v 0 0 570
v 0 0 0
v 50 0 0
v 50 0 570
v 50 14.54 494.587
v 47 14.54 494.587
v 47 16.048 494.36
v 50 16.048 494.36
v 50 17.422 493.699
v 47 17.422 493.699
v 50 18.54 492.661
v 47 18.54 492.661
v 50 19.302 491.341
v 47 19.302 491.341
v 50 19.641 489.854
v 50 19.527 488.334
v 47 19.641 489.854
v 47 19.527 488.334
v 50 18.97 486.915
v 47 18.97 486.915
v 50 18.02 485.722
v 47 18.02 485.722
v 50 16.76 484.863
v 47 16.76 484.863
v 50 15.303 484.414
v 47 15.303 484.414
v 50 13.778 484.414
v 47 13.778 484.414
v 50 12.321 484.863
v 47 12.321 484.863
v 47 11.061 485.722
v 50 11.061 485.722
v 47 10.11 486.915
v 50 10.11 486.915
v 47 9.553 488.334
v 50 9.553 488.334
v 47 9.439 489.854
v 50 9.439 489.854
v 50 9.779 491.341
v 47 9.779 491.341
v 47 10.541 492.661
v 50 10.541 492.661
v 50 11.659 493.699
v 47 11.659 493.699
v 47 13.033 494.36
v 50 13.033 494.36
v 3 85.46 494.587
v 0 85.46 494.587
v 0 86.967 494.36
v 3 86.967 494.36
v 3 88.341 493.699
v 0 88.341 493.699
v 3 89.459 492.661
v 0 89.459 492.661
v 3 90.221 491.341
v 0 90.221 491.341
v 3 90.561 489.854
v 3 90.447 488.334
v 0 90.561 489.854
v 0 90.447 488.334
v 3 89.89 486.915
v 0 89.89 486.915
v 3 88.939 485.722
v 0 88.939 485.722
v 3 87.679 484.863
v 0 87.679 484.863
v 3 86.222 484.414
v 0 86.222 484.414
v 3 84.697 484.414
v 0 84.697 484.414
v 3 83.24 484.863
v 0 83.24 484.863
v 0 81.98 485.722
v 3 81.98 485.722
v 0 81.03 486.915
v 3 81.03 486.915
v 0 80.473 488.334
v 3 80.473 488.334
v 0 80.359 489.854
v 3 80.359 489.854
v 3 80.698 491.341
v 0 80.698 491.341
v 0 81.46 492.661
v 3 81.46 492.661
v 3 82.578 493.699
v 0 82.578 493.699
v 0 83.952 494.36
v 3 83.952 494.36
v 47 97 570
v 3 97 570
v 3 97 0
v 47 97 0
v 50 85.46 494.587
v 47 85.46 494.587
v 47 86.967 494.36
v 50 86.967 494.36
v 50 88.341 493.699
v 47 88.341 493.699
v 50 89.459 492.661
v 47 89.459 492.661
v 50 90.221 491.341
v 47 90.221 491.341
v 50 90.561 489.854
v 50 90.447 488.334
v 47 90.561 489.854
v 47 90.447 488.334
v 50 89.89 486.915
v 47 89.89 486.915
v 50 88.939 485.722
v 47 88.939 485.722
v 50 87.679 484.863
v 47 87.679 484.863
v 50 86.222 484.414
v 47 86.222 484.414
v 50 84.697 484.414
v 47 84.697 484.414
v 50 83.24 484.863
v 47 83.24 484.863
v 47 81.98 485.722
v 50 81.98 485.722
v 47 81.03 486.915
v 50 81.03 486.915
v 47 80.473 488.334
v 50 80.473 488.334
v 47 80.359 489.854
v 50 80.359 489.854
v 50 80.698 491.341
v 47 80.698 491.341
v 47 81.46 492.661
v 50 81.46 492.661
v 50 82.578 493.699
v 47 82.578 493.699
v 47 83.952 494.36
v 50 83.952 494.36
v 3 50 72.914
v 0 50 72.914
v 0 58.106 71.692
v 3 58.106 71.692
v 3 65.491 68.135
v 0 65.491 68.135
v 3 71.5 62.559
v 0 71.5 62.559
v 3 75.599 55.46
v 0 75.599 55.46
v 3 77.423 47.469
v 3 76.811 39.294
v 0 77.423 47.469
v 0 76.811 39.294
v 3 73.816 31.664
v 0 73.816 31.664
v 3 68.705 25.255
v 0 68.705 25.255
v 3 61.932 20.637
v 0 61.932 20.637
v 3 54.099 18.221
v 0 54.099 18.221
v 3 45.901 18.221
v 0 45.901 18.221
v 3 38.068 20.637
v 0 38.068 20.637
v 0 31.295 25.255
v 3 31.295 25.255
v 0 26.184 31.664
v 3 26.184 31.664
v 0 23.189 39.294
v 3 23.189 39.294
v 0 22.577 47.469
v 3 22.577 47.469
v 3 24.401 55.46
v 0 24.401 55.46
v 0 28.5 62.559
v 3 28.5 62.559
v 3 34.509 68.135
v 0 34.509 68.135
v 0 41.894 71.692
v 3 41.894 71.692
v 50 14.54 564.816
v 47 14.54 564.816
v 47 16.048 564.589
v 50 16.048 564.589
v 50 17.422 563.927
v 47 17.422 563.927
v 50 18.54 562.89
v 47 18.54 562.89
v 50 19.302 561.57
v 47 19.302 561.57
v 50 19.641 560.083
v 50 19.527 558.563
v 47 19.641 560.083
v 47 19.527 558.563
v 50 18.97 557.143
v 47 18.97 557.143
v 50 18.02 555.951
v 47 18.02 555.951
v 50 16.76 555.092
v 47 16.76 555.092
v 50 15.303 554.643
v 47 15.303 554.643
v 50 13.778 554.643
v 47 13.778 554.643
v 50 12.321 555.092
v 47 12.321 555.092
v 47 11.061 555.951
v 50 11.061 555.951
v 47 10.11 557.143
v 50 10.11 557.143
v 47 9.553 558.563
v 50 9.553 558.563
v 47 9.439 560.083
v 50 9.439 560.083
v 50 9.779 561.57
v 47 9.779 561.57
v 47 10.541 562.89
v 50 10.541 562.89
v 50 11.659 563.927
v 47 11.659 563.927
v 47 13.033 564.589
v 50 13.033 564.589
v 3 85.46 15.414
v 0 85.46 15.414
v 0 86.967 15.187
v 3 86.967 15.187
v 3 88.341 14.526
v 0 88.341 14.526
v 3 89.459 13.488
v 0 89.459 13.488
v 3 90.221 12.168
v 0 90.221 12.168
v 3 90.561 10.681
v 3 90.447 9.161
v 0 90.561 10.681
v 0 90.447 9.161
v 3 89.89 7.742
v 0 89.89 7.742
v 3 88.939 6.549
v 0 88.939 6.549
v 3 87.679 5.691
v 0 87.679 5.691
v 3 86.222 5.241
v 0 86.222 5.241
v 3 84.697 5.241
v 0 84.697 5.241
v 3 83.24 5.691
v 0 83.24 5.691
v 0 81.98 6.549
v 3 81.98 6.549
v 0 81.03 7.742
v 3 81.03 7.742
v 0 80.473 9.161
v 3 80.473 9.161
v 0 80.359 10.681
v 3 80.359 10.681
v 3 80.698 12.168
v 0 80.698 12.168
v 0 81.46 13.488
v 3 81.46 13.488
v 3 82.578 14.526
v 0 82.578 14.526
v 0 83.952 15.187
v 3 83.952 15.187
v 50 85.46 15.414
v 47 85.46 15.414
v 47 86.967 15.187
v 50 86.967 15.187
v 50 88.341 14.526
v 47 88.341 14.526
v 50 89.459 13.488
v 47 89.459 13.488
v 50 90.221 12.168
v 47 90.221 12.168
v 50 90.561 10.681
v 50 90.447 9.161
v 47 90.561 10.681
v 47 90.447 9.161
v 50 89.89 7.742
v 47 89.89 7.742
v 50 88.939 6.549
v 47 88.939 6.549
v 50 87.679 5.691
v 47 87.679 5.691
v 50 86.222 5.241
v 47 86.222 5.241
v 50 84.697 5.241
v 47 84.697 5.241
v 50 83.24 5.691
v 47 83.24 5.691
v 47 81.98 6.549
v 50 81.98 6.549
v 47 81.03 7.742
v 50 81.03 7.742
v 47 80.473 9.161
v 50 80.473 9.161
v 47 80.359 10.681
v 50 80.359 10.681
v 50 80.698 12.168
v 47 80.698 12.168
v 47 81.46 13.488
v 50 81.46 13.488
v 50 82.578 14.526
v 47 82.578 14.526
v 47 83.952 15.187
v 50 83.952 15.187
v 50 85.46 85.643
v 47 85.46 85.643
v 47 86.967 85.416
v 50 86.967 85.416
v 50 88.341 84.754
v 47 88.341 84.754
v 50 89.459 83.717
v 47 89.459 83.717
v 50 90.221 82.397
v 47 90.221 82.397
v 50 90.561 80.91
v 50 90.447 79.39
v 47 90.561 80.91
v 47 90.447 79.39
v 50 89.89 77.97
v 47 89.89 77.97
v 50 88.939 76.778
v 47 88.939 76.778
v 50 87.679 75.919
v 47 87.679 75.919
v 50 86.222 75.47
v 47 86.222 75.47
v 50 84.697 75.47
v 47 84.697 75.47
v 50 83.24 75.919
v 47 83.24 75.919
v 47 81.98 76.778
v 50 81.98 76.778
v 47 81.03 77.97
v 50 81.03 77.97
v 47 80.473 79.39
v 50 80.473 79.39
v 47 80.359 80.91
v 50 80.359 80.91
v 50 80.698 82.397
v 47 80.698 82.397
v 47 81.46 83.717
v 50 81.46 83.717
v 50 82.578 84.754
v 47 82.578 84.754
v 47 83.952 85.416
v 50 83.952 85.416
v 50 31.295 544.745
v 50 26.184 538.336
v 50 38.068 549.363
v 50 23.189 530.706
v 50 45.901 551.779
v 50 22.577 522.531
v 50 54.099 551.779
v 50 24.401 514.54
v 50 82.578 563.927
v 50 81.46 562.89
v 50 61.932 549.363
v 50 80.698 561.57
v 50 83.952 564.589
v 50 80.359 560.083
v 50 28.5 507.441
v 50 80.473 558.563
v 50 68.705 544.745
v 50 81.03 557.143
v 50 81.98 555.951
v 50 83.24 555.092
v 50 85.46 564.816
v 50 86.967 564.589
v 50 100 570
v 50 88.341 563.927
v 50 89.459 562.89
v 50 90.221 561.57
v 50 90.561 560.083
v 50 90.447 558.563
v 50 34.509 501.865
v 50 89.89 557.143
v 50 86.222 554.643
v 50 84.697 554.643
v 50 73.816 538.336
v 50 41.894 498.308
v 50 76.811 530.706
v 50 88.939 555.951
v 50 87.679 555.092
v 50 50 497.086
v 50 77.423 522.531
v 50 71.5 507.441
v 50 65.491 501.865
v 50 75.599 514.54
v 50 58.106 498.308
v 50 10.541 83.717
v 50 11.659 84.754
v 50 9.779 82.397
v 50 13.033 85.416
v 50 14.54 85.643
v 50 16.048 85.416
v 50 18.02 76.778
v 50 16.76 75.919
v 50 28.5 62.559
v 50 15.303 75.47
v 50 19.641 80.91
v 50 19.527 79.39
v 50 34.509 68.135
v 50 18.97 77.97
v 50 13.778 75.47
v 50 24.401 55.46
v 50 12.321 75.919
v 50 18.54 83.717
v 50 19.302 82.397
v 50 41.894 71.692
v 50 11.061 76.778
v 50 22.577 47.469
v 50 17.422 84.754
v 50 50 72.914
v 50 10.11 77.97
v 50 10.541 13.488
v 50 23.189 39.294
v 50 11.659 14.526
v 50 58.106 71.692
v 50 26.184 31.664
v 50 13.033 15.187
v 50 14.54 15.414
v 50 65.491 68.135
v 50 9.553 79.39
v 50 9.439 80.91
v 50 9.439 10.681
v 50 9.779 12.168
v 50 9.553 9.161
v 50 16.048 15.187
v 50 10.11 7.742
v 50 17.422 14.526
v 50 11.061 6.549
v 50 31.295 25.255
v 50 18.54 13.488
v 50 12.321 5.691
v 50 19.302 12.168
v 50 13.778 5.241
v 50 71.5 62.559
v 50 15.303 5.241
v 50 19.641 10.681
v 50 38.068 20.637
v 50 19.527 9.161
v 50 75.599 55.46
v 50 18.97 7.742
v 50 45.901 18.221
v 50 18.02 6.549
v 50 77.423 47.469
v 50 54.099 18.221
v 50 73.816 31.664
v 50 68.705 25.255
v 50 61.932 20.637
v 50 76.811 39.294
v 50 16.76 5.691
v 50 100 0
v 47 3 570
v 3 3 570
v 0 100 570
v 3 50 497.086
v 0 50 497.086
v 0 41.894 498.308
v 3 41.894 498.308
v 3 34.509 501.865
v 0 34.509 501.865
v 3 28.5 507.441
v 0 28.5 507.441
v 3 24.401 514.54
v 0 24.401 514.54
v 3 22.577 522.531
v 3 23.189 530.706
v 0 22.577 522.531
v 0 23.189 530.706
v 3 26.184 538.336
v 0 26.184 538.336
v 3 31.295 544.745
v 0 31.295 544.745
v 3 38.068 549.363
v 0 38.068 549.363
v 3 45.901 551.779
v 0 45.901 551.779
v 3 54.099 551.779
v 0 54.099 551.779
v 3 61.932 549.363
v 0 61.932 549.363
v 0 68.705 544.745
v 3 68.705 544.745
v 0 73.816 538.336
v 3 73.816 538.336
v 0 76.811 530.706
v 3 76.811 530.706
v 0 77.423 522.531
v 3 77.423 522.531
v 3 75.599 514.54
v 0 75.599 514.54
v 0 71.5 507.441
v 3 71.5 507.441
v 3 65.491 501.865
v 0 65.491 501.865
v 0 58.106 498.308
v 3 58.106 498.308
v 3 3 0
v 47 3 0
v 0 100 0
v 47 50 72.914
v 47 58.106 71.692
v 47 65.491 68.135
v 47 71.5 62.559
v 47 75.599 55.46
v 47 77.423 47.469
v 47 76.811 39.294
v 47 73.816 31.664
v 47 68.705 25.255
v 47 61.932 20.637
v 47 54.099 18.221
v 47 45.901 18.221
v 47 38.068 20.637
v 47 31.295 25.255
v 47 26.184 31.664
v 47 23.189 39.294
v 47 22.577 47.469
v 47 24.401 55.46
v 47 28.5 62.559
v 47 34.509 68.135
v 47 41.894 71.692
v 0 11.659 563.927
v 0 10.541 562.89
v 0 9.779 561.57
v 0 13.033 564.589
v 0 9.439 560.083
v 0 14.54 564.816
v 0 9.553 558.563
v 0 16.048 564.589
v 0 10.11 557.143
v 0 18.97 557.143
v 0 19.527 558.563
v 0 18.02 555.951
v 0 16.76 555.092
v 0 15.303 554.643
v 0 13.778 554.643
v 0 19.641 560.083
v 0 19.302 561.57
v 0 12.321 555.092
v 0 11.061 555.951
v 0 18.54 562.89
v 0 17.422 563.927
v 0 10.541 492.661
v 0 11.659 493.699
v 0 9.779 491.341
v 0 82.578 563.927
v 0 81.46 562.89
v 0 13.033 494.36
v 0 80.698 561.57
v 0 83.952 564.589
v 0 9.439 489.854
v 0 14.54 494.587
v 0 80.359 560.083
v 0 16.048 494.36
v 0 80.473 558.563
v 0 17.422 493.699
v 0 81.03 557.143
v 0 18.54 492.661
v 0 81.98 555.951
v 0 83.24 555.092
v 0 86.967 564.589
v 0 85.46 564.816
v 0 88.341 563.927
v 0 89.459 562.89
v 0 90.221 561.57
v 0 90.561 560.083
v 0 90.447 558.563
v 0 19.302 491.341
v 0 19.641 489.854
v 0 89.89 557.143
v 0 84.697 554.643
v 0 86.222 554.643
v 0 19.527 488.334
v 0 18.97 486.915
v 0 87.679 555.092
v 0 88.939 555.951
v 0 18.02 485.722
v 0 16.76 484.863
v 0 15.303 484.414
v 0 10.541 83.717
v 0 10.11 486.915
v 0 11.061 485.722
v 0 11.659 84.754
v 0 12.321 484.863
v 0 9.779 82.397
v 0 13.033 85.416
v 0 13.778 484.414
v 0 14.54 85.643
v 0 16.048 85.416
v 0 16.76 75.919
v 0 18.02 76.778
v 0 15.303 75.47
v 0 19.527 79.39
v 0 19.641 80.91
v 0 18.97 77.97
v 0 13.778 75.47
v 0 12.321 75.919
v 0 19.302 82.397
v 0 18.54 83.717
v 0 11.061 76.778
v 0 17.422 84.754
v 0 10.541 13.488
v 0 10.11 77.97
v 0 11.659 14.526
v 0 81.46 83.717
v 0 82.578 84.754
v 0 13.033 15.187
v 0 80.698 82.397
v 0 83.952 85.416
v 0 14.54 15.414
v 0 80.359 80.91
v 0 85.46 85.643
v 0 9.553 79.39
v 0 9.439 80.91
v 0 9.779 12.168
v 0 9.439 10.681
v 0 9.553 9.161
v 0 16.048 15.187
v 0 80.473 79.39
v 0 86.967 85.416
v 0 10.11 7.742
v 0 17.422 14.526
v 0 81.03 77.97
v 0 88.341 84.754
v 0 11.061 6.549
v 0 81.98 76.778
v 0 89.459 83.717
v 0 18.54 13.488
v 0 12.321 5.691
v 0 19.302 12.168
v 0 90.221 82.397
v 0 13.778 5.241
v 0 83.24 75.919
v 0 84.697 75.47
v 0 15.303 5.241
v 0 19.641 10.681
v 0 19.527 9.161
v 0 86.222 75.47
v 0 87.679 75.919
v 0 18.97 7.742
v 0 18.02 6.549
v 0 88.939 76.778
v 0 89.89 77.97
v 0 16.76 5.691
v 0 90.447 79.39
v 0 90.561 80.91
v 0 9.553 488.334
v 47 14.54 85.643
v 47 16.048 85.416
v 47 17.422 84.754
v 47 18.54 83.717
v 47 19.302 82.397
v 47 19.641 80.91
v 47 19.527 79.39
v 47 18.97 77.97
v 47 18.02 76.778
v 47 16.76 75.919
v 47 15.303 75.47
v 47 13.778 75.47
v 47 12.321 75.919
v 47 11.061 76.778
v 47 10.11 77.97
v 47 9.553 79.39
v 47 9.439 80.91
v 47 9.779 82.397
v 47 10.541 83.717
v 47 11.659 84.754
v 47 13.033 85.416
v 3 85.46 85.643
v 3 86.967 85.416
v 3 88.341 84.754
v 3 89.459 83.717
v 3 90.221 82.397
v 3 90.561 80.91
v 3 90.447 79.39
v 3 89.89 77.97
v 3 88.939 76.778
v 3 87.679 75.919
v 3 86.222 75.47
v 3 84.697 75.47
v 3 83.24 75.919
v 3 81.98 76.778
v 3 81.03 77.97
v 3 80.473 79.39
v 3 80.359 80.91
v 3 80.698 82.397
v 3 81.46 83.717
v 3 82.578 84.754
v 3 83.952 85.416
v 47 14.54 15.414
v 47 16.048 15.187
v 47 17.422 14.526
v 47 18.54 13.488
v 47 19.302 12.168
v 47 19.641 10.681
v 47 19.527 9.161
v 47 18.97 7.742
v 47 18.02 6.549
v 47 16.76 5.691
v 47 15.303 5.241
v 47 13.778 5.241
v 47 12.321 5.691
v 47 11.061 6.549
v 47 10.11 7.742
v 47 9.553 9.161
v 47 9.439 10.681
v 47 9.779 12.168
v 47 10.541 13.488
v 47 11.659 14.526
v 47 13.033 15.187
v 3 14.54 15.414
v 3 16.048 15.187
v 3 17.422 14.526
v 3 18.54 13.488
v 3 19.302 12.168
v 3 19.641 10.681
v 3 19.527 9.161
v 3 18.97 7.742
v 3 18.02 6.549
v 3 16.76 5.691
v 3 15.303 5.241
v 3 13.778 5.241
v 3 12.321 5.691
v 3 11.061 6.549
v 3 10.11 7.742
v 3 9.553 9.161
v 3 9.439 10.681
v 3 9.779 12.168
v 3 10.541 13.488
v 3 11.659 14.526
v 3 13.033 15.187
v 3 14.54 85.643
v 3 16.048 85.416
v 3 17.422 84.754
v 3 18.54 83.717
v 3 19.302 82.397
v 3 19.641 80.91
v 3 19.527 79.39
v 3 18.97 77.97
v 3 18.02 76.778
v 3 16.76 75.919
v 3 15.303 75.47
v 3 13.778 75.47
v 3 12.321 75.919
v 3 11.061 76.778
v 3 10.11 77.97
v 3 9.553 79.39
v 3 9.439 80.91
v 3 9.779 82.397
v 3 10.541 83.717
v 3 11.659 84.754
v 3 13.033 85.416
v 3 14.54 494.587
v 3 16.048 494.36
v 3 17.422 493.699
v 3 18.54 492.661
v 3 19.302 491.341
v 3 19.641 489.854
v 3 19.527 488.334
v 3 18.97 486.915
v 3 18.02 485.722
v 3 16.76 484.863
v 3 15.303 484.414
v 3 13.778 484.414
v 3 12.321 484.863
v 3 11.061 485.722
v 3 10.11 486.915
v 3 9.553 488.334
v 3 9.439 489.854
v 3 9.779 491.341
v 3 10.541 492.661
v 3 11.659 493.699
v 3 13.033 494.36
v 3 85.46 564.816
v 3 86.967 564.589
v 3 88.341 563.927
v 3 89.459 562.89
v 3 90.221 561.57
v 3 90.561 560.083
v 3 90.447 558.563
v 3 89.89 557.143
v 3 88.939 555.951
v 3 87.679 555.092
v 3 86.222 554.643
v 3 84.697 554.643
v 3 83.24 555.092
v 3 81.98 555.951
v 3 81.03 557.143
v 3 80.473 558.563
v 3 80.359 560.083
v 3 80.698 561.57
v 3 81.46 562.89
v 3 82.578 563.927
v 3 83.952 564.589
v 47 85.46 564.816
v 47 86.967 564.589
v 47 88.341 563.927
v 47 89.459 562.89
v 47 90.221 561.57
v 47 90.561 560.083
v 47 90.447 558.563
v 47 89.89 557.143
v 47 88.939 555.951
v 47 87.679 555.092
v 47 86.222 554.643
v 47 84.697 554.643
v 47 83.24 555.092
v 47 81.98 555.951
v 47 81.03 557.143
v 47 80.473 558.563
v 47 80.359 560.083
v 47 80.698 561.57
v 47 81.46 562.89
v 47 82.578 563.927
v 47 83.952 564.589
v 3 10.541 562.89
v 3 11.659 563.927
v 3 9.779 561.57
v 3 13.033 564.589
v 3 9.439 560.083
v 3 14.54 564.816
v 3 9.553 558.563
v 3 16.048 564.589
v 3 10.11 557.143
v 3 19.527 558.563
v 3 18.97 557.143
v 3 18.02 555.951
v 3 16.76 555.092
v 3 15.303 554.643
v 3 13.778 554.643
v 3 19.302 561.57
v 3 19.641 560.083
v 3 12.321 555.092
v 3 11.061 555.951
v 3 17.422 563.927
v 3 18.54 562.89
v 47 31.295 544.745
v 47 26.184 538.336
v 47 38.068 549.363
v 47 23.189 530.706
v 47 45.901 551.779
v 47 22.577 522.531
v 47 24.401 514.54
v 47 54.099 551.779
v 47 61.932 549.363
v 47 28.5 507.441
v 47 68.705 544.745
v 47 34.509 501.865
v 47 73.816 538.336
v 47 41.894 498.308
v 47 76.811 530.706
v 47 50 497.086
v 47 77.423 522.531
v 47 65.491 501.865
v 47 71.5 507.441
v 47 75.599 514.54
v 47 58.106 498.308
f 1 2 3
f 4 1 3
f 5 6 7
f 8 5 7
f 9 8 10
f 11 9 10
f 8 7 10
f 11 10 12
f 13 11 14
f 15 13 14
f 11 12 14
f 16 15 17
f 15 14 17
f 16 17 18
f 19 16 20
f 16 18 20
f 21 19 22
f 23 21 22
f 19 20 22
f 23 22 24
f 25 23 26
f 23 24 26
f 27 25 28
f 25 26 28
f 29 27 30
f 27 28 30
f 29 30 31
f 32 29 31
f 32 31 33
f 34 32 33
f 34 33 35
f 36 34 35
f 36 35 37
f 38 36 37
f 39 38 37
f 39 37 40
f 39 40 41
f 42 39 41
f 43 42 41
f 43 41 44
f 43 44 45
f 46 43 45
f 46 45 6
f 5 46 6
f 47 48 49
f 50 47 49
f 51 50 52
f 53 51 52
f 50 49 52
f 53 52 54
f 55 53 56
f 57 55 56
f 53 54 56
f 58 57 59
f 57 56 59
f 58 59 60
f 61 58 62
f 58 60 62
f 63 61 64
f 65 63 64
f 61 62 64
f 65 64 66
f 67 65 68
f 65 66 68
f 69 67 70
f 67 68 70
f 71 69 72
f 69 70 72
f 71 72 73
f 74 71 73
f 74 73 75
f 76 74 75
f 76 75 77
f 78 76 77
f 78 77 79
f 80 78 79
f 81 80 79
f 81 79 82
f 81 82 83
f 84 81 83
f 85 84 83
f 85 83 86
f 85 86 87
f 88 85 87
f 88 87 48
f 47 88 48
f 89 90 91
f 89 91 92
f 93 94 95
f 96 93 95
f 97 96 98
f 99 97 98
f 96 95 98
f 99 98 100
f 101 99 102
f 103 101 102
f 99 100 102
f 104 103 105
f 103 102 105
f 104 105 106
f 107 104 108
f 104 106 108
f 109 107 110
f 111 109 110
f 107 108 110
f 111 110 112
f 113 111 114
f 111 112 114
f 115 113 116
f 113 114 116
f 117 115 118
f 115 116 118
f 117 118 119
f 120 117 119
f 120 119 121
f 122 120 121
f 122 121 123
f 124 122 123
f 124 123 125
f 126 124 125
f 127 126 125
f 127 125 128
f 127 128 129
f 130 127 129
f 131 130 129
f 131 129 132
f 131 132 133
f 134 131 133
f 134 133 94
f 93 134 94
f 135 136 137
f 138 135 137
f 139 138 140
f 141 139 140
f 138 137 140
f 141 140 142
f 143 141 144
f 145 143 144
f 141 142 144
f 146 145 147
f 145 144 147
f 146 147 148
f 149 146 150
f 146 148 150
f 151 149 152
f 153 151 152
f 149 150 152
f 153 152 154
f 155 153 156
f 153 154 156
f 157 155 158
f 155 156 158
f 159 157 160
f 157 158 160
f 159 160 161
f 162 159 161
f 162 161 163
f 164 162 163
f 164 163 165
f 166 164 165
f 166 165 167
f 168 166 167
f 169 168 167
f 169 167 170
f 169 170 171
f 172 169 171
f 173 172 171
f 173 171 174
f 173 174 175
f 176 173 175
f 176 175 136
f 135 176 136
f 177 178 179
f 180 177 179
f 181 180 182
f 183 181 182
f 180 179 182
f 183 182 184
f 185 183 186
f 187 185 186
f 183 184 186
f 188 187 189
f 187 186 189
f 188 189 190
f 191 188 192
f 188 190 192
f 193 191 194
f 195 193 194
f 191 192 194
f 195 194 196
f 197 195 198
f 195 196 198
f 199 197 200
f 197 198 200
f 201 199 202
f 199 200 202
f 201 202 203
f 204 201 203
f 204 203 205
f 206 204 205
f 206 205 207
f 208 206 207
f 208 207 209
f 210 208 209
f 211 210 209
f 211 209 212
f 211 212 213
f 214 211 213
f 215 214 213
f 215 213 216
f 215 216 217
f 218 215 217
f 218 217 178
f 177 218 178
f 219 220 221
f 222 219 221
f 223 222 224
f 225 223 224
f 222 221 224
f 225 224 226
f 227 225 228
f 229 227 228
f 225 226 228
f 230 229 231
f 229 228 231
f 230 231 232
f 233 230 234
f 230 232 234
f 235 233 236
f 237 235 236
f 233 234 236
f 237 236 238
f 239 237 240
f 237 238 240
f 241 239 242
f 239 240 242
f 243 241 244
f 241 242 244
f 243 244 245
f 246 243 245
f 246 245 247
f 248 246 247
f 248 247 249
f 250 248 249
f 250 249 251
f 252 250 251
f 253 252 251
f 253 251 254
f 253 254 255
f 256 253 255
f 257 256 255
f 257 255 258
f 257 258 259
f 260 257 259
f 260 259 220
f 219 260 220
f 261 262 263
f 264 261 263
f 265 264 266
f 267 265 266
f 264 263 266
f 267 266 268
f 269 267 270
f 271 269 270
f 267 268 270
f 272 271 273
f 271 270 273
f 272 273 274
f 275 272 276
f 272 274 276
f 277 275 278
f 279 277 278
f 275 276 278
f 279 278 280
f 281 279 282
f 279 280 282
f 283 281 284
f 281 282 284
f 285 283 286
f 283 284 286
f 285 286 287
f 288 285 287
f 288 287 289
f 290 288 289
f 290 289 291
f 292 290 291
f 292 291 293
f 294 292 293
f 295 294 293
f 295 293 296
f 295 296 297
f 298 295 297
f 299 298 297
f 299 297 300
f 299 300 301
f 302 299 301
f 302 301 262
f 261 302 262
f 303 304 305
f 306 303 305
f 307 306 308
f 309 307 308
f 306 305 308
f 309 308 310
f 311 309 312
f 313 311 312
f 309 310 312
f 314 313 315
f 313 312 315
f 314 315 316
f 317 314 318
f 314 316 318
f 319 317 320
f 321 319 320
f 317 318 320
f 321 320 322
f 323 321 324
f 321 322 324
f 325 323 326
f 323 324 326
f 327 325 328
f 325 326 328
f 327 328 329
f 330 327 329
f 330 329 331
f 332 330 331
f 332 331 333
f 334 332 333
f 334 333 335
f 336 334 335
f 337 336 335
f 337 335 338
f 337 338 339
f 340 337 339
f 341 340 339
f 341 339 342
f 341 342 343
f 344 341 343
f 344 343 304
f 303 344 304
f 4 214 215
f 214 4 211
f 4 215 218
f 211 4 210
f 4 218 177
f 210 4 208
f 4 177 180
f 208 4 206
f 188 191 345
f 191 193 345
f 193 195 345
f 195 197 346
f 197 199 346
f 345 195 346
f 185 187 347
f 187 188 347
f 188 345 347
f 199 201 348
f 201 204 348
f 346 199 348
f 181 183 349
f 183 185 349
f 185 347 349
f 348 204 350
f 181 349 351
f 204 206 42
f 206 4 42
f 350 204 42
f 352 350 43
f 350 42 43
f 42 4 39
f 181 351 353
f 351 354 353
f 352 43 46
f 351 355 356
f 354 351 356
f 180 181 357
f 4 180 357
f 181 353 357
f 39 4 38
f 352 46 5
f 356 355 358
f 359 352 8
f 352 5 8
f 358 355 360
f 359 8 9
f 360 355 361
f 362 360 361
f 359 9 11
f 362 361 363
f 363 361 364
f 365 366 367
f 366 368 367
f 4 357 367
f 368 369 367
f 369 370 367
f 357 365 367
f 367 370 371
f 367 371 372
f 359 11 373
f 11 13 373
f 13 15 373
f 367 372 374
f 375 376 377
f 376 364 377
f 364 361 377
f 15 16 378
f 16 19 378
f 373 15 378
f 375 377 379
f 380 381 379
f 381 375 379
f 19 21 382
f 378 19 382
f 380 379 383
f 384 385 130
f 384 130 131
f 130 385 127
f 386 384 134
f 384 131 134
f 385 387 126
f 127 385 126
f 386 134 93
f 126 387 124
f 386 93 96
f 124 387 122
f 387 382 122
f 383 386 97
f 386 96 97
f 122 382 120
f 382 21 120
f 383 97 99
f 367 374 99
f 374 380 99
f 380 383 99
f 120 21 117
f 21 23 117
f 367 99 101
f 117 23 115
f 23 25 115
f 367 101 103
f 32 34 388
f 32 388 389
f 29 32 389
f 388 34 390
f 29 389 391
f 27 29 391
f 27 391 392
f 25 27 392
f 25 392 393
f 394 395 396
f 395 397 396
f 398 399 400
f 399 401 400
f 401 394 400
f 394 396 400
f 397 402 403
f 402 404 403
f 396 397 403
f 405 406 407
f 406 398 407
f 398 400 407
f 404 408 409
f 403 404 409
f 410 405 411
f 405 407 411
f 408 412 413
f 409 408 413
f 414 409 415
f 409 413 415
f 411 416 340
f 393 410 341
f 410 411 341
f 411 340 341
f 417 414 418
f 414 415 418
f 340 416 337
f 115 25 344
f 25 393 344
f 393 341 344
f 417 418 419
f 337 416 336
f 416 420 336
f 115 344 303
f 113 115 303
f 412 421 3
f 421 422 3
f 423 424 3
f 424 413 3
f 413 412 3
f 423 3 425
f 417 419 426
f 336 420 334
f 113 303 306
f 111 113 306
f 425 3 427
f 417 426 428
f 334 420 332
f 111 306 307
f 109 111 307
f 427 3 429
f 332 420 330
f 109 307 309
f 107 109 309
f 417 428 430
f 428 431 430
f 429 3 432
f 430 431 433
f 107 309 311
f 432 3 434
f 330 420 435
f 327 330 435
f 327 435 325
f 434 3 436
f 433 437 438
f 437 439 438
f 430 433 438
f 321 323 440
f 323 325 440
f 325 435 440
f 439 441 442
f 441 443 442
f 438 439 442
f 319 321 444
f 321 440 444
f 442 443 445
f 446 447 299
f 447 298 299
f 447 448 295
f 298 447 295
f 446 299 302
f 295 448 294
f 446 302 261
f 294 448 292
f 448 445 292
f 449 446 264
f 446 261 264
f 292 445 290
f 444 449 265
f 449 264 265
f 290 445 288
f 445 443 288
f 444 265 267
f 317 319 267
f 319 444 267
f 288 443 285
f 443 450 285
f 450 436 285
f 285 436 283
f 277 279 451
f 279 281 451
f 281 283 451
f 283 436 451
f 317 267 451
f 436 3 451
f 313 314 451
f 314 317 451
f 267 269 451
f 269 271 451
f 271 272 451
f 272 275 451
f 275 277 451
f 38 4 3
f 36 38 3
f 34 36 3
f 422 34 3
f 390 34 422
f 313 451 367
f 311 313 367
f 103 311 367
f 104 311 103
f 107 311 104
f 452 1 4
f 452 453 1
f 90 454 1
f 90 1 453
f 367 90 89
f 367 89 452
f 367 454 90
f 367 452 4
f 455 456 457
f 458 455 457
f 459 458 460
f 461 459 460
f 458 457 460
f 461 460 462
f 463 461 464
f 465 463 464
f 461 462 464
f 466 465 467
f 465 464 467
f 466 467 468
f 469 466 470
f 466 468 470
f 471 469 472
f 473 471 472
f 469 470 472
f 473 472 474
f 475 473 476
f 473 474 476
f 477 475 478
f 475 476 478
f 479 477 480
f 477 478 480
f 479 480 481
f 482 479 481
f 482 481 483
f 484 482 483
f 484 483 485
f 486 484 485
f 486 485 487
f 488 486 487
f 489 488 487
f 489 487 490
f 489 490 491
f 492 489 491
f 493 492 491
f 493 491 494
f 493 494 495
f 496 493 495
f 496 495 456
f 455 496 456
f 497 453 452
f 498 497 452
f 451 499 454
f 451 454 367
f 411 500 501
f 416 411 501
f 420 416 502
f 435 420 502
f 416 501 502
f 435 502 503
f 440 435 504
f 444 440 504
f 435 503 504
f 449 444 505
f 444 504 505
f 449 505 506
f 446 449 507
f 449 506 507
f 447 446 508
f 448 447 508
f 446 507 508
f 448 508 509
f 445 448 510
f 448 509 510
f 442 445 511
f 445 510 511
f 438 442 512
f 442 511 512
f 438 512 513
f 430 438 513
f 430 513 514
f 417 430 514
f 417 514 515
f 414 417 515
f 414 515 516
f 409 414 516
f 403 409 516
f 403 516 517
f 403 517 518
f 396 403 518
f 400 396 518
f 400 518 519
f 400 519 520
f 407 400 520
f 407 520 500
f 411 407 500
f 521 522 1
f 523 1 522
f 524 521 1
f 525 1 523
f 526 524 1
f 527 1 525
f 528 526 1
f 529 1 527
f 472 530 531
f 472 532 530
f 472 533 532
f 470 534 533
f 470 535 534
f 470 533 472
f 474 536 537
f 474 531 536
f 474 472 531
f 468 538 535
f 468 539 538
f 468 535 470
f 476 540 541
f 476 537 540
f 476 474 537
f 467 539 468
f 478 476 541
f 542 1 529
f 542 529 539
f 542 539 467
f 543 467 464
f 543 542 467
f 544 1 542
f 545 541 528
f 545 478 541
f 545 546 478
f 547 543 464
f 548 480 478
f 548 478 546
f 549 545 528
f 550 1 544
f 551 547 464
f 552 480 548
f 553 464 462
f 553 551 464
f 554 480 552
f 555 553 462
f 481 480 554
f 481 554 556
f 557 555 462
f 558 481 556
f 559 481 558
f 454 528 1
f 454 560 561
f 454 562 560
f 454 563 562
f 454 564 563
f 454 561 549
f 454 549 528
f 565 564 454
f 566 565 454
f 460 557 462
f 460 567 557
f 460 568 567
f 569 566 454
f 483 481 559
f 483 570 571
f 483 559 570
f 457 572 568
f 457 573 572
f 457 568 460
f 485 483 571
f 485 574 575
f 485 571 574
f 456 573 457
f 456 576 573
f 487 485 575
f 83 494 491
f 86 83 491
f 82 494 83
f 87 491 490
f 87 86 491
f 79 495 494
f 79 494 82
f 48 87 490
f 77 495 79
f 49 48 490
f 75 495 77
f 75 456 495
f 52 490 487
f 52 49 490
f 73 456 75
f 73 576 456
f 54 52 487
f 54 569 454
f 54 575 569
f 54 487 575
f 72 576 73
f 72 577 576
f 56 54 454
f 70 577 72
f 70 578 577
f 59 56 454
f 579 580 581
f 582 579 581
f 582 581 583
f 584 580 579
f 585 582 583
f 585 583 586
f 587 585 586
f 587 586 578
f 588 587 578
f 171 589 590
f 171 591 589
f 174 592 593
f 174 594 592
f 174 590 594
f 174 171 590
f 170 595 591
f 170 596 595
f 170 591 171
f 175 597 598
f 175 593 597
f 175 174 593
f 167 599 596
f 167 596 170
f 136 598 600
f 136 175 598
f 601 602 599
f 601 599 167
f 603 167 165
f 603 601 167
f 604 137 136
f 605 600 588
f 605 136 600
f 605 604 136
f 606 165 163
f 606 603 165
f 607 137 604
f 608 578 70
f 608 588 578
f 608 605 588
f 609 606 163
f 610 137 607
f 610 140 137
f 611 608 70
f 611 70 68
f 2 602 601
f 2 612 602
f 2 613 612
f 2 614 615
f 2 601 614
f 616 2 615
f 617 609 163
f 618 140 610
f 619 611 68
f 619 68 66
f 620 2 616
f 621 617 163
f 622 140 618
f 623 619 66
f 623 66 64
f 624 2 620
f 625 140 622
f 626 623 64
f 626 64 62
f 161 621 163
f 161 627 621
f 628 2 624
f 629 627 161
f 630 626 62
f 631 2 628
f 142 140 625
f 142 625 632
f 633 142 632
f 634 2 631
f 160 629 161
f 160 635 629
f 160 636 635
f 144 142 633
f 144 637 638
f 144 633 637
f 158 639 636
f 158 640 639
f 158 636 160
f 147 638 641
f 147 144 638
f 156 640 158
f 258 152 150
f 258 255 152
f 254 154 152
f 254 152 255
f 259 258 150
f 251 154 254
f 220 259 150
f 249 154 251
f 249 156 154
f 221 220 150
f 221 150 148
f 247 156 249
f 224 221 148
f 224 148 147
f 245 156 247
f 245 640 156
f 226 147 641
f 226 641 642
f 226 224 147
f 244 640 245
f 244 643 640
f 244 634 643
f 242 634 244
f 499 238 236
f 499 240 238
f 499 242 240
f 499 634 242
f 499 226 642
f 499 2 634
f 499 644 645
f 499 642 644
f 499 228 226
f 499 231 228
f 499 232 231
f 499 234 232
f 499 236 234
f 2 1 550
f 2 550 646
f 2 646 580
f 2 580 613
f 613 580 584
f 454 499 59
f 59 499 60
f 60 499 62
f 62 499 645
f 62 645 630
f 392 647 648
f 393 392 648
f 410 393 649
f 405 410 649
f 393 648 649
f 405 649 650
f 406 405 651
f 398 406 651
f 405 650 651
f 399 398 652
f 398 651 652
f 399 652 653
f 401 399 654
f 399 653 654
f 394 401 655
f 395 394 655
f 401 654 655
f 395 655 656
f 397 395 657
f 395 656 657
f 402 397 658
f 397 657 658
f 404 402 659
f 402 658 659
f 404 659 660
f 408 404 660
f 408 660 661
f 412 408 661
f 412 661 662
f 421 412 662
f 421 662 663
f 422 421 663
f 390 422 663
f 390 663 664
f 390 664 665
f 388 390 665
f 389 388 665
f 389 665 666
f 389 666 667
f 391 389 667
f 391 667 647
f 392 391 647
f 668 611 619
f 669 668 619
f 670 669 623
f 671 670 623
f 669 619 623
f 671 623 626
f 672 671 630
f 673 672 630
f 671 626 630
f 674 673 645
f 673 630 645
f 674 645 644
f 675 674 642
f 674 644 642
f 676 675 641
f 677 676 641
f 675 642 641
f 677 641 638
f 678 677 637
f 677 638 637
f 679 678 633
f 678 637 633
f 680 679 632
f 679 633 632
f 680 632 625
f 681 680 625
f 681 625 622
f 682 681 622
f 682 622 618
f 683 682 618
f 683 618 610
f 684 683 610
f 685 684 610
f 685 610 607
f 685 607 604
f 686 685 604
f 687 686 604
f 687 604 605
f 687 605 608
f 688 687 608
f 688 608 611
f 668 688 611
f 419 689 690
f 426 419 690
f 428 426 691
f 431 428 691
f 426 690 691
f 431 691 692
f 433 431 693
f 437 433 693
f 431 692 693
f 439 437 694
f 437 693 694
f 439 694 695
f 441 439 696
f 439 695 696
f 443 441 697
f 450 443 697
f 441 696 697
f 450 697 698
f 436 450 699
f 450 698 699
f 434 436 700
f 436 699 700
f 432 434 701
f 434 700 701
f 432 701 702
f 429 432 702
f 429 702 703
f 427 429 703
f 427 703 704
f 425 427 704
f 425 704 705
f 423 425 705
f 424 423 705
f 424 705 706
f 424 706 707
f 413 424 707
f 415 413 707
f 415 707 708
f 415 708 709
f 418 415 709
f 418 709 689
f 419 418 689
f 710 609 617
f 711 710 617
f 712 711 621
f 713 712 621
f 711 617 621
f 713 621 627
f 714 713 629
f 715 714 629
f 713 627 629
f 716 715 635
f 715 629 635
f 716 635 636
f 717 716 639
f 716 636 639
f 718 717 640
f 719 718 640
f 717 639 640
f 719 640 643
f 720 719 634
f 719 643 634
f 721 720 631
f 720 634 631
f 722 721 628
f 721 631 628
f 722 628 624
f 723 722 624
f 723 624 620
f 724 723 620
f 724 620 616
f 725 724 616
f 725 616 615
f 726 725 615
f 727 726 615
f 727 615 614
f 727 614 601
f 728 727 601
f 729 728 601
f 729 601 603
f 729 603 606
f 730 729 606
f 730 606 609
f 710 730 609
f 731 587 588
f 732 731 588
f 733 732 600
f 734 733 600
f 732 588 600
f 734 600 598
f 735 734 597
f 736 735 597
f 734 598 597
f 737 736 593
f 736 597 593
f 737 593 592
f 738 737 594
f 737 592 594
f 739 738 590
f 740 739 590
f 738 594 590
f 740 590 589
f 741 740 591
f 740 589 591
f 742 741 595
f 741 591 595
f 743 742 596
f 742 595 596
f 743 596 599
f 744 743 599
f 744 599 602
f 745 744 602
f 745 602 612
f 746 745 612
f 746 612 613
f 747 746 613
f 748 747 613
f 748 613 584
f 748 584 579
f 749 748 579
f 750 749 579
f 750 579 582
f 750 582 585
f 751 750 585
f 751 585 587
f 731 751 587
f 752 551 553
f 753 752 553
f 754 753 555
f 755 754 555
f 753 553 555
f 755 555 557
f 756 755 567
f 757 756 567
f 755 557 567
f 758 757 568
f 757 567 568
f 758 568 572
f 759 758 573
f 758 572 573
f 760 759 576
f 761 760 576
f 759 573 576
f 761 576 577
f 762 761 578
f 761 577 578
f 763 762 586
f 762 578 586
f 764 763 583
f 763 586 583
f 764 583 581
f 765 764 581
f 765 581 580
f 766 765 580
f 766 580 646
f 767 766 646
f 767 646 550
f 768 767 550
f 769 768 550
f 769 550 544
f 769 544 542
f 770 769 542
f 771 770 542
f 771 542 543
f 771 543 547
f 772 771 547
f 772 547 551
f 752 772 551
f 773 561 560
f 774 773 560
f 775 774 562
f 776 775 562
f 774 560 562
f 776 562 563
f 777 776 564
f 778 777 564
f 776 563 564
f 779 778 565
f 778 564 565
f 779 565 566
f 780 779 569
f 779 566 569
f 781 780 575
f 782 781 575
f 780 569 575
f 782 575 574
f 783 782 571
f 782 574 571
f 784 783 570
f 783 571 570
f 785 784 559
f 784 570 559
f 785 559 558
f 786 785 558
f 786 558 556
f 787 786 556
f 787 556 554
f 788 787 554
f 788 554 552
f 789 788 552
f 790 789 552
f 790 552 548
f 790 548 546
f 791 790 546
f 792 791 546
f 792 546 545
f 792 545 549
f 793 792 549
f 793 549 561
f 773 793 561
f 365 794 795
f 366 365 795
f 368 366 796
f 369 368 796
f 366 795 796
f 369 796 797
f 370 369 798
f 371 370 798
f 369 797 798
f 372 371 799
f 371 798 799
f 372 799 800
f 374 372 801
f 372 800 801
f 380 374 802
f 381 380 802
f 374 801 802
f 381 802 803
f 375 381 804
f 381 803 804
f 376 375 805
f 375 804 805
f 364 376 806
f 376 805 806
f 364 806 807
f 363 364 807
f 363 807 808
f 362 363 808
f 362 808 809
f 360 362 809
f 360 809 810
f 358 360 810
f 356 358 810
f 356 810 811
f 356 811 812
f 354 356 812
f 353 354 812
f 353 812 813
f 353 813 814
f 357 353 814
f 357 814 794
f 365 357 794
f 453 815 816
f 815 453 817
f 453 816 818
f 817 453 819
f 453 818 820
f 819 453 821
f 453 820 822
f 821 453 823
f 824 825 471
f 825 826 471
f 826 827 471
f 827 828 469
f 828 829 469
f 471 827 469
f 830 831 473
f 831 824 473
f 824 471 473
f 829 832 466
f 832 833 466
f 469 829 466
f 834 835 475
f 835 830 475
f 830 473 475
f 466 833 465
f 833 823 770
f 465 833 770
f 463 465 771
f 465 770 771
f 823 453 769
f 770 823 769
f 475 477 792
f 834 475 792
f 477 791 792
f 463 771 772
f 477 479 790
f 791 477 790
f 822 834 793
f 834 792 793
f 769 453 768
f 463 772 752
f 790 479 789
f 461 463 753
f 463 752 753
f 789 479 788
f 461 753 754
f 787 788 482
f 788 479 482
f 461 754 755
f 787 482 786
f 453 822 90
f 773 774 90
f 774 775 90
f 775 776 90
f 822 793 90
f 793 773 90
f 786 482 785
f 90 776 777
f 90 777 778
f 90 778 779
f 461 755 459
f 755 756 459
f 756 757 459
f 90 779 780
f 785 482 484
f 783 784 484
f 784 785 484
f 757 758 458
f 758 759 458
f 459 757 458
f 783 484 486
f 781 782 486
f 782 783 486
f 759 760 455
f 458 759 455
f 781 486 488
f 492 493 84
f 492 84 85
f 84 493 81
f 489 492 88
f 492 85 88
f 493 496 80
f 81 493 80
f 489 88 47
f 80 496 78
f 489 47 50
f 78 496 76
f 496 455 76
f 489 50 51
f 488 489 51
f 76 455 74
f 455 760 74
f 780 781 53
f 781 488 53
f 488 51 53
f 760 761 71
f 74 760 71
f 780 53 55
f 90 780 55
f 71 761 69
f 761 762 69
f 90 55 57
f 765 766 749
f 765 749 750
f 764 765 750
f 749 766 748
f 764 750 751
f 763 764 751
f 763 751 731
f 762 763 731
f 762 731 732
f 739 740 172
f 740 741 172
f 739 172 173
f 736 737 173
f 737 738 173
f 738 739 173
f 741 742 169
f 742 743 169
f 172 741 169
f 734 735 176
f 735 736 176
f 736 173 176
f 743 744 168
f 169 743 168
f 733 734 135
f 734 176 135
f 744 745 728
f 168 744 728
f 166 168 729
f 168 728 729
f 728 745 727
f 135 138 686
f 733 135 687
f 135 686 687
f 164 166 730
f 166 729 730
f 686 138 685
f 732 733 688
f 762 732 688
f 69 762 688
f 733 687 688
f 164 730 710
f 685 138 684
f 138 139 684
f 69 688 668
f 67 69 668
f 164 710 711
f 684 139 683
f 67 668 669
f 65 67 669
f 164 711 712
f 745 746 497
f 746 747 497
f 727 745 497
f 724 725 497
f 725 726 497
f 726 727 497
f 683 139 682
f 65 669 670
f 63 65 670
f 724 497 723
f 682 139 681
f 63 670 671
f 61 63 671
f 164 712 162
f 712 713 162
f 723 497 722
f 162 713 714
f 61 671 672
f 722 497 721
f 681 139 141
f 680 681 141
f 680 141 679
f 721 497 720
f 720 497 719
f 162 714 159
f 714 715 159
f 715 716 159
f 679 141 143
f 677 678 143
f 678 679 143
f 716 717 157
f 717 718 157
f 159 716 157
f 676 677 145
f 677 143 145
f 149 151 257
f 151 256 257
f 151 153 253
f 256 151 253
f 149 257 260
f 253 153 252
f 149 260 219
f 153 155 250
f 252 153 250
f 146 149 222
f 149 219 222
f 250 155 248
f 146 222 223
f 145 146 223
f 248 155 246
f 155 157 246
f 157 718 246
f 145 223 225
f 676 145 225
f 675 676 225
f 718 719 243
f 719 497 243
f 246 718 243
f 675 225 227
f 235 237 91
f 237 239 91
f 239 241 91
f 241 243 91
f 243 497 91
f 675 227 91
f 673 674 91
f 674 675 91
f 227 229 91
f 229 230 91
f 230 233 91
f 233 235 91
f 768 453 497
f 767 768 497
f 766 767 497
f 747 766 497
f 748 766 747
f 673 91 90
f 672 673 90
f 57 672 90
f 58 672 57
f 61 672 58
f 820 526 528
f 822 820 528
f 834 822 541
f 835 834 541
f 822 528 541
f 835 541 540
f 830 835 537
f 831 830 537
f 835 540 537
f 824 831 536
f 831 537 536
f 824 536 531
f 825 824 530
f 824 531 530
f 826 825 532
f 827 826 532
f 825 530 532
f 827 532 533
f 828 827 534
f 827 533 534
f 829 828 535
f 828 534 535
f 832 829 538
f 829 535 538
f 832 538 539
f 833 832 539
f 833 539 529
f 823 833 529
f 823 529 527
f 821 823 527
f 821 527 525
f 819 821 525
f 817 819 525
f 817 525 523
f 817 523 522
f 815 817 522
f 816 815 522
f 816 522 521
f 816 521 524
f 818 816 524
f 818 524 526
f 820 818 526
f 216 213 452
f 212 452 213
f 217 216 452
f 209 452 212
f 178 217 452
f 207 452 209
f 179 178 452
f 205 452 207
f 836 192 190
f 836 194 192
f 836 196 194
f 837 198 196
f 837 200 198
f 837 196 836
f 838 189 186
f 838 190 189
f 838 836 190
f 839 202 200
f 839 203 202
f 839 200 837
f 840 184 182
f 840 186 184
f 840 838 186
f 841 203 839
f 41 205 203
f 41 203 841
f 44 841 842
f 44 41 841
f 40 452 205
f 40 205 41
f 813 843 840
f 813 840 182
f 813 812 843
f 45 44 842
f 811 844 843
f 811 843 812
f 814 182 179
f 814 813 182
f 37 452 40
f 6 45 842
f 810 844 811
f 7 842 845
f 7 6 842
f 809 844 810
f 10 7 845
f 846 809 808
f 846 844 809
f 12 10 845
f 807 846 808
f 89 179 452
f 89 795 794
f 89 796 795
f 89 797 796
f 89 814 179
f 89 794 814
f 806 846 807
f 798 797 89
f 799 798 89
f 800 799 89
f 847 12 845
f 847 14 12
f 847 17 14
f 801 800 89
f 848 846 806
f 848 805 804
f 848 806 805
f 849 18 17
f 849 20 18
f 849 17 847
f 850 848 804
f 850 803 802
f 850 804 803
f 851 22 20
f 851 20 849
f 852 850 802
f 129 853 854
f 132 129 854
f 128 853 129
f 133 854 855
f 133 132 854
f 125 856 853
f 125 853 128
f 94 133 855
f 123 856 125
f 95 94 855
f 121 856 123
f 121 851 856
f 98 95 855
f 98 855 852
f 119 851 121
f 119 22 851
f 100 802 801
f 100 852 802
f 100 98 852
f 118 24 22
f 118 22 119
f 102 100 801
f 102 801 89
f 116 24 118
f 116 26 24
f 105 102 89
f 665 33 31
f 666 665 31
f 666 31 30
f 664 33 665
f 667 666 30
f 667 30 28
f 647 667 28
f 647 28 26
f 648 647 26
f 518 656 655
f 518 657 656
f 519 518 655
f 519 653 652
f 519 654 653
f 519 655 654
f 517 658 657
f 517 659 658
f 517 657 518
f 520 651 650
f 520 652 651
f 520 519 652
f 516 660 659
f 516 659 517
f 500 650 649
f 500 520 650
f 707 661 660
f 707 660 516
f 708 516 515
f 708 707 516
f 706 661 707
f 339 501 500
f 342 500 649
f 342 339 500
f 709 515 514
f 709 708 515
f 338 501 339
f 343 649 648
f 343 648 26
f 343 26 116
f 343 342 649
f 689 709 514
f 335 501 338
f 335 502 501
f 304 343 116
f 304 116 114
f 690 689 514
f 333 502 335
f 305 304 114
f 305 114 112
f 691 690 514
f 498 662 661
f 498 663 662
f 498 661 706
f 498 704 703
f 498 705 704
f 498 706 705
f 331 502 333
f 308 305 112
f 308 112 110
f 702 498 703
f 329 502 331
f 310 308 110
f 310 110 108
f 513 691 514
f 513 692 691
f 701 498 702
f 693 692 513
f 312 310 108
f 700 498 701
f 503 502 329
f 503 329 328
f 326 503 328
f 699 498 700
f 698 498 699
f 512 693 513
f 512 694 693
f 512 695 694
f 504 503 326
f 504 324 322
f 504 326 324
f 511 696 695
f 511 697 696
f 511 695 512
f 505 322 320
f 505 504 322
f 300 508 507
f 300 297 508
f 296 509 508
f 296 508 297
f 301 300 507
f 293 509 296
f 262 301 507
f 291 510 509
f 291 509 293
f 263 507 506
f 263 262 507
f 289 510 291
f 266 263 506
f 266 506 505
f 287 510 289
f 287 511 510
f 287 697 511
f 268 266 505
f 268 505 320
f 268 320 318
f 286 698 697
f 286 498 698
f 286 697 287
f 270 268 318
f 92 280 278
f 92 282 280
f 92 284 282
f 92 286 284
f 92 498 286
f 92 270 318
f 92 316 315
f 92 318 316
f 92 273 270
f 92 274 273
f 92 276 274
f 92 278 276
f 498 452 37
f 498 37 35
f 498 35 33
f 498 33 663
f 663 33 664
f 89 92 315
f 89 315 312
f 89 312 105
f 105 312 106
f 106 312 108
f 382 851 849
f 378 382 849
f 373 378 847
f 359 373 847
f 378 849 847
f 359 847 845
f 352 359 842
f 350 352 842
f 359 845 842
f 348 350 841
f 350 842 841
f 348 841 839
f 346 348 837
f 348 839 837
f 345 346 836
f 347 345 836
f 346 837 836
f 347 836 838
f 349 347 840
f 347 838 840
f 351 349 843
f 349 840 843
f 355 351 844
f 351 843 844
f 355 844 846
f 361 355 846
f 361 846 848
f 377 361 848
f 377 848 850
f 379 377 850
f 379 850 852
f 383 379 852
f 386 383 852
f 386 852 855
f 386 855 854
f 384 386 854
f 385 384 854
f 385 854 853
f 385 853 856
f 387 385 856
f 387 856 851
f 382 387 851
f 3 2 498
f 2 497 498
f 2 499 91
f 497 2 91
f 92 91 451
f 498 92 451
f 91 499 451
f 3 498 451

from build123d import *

# Parameters (mm, degrees)
SKETCH1_W           = 50
SKETCH1_H           = 100
SKETCH1_W_2         = 44
SKETCH1_H_2         = 94
BOSS_EXTRUDE1_DEPTH = 570
SKETCH2_R           = 27.5
CUT_EXTRUDE1_DEPTH  = 570
SKETCH3_R           = 5.115212426
CUT_EXTRUDE2_DEPTH  = 570


with BuildPart() as part:
    # Sketch1 → Boss-Extrude1 (new body)
    with BuildSketch(Plane.XY):
        with Locations((25, 50)):
            Rectangle(SKETCH1_W, SKETCH1_H)
        with Locations((25, 50)):
            Rectangle(SKETCH1_W_2, SKETCH1_H_2, mode=Mode.SUBTRACT)
    extrude(amount=BOSS_EXTRUDE1_DEPTH)

    # Sketch2 → Cut-Extrude1 (cut)
    with BuildSketch(Plane.ZY):
        with Locations((45.413528793, 50)):
            Circle(SKETCH2_R)
        with Locations(Location((524.586471207, 50, 0), (0, 0, 180))):
            Circle(SKETCH2_R)
    extrude(amount=-CUT_EXTRUDE1_DEPTH, mode=Mode.SUBTRACT)

    # Sketch3 → Cut-Extrude2 (cut)
    with BuildSketch(Plane.ZY):
        with Locations((80.527883109, 85.459683227)):
            Circle(SKETCH3_R)
        with Locations((10.299174477, 14.540316773)):
            Circle(SKETCH3_R)
        with Locations((80.527883109, 14.540316773)):
            Circle(SKETCH3_R)
        with Locations((559.700825523, 85.459683227)):
            Circle(SKETCH3_R)
        with Locations((489.472116891, 85.459683227)):
            Circle(SKETCH3_R)
        with Locations((489.472116891, 14.540316773)):
            Circle(SKETCH3_R)
        with Locations((559.700825523, 14.540316773)):
            Circle(SKETCH3_R)
        with Locations((10.299174477, 85.459683227)):
            Circle(SKETCH3_R)
    extrude(amount=-CUT_EXTRUDE2_DEPTH, mode=Mode.SUBTRACT)


solid = part.part
